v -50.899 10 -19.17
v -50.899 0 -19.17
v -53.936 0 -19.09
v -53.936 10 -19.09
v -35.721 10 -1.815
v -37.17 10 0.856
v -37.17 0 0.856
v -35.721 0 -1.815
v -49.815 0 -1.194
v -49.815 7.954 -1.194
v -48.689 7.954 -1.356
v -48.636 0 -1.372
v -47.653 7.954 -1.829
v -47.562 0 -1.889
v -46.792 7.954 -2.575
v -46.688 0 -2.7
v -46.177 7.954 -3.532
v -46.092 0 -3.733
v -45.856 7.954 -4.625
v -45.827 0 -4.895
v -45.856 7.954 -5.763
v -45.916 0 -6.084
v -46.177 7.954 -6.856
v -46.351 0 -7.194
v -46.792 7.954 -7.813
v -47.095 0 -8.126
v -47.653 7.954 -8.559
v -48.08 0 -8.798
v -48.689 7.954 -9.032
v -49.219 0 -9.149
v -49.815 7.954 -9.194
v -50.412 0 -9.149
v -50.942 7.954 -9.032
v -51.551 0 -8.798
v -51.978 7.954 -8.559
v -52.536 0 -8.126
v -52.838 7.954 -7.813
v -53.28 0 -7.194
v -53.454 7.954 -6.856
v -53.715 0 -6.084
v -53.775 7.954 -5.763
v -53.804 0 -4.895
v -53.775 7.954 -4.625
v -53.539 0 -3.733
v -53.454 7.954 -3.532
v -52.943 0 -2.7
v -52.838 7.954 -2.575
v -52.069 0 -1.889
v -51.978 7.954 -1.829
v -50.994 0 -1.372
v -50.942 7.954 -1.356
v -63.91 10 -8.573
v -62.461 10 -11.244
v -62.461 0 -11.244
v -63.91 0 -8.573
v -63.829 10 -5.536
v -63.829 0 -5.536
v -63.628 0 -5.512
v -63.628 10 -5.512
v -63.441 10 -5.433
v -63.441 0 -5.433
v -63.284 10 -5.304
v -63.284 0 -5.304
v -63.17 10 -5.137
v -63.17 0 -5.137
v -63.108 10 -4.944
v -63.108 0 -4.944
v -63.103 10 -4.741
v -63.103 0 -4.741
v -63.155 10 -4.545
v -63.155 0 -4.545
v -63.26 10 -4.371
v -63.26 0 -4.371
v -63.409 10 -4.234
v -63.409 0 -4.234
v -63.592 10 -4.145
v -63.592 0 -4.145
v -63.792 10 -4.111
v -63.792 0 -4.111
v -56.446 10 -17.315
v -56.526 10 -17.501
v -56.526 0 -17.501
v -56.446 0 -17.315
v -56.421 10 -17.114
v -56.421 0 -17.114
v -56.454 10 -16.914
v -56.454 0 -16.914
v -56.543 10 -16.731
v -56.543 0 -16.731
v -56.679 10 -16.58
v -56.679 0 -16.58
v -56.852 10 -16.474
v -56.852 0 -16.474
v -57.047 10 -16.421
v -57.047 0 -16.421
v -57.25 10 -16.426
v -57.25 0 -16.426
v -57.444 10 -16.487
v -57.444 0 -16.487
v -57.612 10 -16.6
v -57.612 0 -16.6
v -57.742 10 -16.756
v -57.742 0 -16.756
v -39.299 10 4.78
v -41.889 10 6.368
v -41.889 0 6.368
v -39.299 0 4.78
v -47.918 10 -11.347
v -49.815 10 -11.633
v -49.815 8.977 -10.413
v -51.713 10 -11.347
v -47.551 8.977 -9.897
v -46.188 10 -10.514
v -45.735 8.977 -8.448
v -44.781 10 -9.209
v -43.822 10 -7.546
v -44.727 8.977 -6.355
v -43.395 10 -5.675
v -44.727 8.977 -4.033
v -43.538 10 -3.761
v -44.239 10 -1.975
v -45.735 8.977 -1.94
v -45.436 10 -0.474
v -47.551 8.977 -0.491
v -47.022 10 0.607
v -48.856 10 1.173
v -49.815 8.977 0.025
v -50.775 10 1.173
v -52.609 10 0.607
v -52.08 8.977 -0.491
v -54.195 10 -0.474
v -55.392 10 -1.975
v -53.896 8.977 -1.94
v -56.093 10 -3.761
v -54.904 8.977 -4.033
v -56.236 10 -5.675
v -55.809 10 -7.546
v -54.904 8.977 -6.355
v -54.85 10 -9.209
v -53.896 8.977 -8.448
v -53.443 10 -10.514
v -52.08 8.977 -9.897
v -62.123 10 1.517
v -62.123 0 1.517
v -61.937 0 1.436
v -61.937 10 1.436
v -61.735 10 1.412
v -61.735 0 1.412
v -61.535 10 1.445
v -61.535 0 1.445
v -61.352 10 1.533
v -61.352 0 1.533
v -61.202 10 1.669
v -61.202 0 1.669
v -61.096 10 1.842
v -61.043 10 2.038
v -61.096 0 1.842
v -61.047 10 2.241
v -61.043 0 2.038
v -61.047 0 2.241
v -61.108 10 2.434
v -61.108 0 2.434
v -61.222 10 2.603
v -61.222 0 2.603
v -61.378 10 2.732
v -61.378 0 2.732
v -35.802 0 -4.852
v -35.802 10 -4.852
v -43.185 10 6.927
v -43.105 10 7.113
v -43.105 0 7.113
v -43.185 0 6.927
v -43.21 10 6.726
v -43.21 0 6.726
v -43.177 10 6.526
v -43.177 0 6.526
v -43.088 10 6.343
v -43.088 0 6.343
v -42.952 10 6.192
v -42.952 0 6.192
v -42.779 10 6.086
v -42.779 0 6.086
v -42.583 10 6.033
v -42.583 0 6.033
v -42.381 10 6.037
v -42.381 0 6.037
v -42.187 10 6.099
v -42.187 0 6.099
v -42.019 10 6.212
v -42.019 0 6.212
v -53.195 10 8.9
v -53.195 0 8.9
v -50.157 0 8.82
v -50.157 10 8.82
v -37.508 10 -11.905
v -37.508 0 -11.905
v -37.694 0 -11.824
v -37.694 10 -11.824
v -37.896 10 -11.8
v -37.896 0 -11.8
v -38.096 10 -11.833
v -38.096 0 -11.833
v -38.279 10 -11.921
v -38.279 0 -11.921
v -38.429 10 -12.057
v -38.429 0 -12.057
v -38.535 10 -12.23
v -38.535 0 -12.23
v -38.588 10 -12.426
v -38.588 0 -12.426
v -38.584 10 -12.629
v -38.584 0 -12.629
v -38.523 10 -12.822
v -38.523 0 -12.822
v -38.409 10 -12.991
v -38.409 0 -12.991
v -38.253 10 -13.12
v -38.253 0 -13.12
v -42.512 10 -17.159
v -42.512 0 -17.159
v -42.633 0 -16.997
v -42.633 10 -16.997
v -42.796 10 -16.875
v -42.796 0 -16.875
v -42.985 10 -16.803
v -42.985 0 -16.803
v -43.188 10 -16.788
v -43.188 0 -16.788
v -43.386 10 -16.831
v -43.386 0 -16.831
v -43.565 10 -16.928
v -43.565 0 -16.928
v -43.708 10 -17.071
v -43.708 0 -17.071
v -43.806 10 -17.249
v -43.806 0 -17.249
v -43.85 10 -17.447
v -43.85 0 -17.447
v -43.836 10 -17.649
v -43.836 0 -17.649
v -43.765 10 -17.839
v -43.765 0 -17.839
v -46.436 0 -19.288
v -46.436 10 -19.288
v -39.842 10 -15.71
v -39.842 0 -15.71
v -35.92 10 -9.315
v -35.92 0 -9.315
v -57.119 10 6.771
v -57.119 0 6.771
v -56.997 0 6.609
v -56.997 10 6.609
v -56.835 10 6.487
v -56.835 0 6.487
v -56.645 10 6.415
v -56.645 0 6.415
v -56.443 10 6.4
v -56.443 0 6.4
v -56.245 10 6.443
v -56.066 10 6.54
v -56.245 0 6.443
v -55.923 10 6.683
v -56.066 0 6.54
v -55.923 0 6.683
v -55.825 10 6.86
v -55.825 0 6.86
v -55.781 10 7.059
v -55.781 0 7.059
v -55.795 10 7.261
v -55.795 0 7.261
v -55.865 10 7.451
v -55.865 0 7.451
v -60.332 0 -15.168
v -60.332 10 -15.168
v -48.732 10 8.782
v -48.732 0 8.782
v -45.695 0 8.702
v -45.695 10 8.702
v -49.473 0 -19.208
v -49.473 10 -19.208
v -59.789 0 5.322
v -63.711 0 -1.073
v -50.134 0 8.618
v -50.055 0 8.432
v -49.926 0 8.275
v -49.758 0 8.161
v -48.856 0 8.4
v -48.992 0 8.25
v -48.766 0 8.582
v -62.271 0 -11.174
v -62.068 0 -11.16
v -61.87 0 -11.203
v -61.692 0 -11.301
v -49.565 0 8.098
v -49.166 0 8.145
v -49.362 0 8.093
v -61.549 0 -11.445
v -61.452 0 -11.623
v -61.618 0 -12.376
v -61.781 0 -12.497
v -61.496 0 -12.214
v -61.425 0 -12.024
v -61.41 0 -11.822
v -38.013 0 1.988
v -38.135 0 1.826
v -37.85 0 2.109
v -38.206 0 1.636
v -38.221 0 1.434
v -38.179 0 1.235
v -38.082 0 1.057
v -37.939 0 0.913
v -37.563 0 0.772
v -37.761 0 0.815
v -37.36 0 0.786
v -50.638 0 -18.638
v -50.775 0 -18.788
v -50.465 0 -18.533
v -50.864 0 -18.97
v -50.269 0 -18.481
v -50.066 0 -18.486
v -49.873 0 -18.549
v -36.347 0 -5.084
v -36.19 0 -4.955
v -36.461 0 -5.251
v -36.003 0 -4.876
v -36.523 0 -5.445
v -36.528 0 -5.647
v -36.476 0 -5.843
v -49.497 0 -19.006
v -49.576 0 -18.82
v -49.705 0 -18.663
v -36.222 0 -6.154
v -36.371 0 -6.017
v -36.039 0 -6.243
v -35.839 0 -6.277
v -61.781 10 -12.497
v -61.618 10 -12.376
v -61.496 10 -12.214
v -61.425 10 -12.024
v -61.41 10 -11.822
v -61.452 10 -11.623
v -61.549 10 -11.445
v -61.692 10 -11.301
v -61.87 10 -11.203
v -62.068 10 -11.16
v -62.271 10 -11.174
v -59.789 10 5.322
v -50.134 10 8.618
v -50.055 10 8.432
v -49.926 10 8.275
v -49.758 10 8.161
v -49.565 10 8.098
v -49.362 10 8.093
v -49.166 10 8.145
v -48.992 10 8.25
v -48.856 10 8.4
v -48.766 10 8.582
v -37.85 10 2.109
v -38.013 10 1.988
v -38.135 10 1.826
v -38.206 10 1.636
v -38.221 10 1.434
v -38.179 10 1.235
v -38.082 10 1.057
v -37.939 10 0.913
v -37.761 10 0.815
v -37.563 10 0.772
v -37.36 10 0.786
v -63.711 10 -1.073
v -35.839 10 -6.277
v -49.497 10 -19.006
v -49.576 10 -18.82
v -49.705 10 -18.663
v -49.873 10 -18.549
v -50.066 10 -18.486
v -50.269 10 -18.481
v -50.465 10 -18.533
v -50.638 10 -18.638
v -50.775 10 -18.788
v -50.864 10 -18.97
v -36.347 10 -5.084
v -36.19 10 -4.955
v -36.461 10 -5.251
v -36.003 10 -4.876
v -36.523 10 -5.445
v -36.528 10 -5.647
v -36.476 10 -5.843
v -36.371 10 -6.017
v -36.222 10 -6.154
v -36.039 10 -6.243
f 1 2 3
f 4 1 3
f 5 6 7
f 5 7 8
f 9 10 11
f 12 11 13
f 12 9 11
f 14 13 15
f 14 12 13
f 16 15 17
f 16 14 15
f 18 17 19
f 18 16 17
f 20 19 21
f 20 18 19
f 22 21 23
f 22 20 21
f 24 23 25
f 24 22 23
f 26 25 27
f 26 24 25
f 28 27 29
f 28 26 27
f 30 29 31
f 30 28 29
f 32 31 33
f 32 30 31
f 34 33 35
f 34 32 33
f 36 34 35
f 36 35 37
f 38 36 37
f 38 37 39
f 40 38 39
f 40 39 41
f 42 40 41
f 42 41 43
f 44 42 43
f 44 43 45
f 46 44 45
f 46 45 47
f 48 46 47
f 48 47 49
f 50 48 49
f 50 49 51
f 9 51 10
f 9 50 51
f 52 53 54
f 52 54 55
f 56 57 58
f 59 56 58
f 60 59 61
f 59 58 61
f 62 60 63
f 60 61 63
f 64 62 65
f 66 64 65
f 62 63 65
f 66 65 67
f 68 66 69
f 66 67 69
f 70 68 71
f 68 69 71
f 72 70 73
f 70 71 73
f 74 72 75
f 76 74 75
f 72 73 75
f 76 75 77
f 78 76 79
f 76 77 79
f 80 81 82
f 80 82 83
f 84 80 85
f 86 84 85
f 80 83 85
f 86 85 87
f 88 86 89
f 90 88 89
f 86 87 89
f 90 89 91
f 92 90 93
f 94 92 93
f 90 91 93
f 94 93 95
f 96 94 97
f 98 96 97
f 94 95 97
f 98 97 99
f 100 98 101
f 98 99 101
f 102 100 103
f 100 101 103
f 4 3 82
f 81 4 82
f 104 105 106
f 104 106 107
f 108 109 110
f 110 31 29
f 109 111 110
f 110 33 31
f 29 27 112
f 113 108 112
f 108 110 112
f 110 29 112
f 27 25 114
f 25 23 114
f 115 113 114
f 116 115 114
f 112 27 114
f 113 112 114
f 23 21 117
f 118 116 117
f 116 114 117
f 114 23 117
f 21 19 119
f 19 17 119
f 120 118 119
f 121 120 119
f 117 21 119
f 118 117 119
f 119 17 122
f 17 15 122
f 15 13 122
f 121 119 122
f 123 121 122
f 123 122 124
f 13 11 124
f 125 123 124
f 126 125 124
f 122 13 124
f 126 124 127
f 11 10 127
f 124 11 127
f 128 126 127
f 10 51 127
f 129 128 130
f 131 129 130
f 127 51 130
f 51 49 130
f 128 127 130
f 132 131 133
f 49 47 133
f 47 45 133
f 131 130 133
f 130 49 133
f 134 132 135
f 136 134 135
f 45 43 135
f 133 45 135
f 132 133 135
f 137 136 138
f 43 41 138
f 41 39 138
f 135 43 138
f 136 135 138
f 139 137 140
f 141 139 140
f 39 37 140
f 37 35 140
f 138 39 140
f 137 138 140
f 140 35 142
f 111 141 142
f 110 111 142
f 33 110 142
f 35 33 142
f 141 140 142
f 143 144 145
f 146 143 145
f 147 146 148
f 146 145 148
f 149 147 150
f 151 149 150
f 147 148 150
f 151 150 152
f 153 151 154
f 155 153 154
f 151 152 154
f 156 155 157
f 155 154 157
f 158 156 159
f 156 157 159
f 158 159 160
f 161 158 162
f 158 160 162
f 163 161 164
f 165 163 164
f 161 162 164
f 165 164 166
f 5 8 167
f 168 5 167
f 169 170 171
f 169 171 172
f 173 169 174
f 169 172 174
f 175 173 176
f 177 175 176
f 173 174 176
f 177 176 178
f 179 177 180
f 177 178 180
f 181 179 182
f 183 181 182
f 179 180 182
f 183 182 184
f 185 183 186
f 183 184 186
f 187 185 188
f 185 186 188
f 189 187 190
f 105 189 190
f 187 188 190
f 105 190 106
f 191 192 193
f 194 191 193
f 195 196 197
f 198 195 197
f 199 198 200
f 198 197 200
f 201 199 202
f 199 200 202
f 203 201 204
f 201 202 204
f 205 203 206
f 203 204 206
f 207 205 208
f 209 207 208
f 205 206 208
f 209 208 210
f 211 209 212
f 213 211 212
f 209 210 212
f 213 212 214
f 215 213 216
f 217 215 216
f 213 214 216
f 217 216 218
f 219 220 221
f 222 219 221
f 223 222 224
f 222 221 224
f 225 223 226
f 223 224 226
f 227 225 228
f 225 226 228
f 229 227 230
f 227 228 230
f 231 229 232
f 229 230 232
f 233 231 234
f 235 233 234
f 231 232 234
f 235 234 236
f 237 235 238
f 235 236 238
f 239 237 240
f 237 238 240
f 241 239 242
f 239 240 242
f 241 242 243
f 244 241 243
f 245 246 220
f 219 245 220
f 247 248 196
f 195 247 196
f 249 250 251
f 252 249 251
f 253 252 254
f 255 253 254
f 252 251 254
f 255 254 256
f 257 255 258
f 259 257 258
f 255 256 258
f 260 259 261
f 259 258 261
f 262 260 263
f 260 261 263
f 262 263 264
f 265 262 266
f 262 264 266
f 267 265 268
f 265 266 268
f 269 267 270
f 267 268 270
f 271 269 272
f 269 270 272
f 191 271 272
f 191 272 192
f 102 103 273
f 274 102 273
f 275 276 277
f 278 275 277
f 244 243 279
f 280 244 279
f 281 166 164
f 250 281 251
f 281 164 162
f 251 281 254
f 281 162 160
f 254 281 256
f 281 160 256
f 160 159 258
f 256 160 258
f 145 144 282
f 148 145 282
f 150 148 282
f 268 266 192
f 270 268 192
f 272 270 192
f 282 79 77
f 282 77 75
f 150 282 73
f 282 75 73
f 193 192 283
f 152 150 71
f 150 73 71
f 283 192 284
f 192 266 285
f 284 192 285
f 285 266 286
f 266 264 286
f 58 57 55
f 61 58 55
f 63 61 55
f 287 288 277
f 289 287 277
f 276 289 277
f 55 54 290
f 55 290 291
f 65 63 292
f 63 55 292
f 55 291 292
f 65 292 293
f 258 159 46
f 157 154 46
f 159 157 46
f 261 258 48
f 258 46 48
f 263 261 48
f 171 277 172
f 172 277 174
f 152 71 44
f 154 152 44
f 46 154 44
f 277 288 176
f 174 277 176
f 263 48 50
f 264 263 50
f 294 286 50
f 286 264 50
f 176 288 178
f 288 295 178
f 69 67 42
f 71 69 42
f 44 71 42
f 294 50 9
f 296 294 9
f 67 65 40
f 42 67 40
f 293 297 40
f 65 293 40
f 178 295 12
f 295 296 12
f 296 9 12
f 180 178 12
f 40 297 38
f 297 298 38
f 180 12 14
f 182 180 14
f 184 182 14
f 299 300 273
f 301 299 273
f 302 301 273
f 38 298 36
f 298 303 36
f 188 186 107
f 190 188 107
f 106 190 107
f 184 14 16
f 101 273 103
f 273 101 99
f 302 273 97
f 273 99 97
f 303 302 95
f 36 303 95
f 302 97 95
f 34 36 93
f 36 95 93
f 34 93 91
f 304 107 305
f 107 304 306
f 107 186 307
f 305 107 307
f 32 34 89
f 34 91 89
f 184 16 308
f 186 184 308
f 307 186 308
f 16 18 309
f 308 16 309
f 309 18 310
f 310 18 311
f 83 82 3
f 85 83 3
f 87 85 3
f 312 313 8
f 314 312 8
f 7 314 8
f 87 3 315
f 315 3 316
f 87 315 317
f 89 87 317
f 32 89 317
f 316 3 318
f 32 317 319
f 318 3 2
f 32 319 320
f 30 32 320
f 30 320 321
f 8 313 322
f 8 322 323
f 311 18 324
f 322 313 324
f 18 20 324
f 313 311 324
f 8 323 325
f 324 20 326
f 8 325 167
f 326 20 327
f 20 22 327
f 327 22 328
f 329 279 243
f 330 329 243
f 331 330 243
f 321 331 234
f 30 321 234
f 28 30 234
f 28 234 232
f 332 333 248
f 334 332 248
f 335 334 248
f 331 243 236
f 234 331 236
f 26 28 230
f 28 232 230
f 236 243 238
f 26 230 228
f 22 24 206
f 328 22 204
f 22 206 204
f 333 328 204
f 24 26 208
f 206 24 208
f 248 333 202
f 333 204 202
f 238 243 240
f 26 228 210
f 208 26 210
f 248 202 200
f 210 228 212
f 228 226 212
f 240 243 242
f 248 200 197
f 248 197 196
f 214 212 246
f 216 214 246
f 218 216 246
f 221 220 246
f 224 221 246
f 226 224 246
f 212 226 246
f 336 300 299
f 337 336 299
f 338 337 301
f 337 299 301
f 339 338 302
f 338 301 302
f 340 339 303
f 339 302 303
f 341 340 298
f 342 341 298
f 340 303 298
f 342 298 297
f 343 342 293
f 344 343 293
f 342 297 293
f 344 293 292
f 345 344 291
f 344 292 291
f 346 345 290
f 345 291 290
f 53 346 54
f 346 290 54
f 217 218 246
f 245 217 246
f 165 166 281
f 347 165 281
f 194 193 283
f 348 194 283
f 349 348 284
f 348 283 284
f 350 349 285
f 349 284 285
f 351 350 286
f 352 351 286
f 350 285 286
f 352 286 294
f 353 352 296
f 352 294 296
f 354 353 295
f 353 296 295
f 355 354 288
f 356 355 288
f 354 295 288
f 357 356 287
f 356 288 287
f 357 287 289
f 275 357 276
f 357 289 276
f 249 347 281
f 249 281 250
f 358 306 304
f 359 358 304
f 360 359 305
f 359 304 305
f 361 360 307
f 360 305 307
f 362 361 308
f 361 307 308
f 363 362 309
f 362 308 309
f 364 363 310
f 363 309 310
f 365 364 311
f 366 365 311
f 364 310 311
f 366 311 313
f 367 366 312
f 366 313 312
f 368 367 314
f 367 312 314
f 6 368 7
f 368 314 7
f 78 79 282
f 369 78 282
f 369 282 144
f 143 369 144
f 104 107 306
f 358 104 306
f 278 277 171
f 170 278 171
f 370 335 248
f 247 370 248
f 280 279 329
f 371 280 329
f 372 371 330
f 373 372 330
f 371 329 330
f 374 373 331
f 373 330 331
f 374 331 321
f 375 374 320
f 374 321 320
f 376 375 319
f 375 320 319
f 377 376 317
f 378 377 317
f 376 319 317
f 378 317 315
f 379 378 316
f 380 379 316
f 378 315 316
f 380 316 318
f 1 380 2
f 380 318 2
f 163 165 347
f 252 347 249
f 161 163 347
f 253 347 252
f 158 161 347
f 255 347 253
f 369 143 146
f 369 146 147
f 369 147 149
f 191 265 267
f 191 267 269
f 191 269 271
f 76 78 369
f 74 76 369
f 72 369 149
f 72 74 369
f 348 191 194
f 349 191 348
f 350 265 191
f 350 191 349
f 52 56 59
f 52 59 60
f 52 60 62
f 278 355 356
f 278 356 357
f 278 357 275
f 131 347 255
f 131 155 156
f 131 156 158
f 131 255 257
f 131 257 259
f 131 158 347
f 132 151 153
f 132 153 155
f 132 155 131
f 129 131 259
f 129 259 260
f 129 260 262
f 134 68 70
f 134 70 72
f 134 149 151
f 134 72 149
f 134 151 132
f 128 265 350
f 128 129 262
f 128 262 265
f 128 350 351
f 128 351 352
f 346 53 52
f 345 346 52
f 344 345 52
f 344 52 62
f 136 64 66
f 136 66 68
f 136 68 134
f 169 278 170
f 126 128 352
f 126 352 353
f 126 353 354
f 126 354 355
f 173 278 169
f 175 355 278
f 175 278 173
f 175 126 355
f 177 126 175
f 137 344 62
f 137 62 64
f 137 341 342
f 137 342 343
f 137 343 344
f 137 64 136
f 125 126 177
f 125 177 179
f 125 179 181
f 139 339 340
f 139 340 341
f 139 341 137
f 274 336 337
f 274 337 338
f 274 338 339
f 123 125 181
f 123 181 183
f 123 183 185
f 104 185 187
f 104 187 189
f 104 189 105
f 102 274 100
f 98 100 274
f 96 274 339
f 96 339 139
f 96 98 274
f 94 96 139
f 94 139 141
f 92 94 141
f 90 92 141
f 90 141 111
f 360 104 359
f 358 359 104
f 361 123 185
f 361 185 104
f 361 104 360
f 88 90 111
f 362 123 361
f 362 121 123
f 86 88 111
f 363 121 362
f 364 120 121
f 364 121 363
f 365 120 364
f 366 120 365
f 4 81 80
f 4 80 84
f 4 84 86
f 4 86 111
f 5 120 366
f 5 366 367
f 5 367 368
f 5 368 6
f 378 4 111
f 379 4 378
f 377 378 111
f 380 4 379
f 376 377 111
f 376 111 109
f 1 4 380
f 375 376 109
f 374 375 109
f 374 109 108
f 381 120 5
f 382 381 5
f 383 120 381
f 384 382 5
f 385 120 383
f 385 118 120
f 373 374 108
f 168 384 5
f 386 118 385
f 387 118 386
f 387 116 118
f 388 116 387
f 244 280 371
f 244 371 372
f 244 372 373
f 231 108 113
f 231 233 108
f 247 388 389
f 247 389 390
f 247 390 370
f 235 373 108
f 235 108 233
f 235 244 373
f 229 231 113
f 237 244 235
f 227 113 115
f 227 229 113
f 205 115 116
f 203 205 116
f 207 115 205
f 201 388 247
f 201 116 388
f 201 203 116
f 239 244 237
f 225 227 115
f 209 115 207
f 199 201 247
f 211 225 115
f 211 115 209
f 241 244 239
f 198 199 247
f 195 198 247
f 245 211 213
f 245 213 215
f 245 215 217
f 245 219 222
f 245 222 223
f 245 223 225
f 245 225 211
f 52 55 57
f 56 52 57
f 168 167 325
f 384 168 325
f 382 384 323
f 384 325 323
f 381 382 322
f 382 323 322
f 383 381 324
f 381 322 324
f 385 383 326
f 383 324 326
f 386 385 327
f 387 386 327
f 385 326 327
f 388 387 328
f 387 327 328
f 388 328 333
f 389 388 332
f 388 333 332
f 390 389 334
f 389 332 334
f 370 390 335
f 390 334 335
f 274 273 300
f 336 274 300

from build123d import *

# Parameters (mm, degrees)
SKETCH1_R                                           = 4
BOSS_EXTRUDE1_DEPTH                                 = 10
CSK_FOR_1_4_FLAT_HEAD_MACHINE_SCREW_100_D           = 7.14248
CSK_FOR_1_4_FLAT_HEAD_MACHINE_SCREW_100_CSINK_D     = 12.8778
CSK_FOR_1_4_FLAT_HEAD_MACHINE_SCREW_100_CSINK_ANGLE = 100


with BuildPart() as part:
    # Sketch1 → Boss-Extrude1 (new body)
    with BuildSketch(Plane(origin=(0, 0, 0), x_dir=(1, 0, 0), z_dir=(0, 1, 0))):
        with BuildLine():
            Line((-62.460834708, 11.244058758), (-63.909867943, 8.573388842))
            Line((-63.909867943, 8.573388842), (-63.829432577, 5.536004231))
            ThreePointArc((-63.829432577, 5.536004231), (-63.097972523, 4.842285457), (-63.791691298, 4.110825404))
            Line((-63.791691298, 4.110825404), (-63.711255932, 1.073440793))
            Line((-63.711255932, 1.073440793), (-62.122904556, -1.516793758))
            ThreePointArc((-62.122904556, -1.516793758), (-61.142582181, -1.751841812), (-61.377630236, -2.732164188))
            Line((-61.377630236, -2.732164188), (-59.78927886, -5.322398739))
            Line((-59.78927886, -5.322398739), (-57.118608944, -6.771431974))
            ThreePointArc((-57.118608944, -6.771431974), (-56.152100835, -6.484828372), (-55.865497234, -7.451336481))
            Line((-55.865497234, -7.451336481), (-53.194827318, -8.900369716))
            Line((-53.194827318, -8.900369716), (-50.157442707, -8.81993435))
            ThreePointArc((-50.157442707, -8.81993435), (-49.463723933, -8.088474296), (-48.732263879, -8.782193071))
            Line((-48.732263879, -8.782193071), (-45.694879269, -8.701757705))
            Line((-45.694879269, -8.701757705), (-43.104644718, -7.11340633))
            ThreePointArc((-43.104644718, -7.11340633), (-42.869596663, -6.133083954), (-41.889274288, -6.368132009))
            Line((-41.889274288, -6.368132009), (-39.299039737, -4.779780634))
            Line((-39.299039737, -4.779780634), (-37.850006502, -2.109110717))
            ThreePointArc((-37.850006502, -2.109110717), (-38.136610103, -1.142602609), (-37.170101995, -0.855999007))
            Line((-37.170101995, -0.855999007), (-35.72106876, 1.814670909))
            Line((-35.72106876, 1.814670909), (-35.801504126, 4.852055519))
            ThreePointArc((-35.801504126, 4.852055519), (-36.532964179, 5.545774294), (-35.839245405, 6.277234347))
            Line((-35.839245405, 6.277234347), (-35.919680771, 9.314618958))
            Line((-35.919680771, 9.314618958), (-37.508032146, 11.904853509))
            ThreePointArc((-37.508032146, 11.904853509), (-38.488354522, 12.139901563), (-38.253306467, 13.120223939))
            Line((-38.253306467, 13.120223939), (-39.841657842, 15.71045849))
            Line((-39.841657842, 15.71045849), (-42.512327759, 17.159491725))
            ThreePointArc((-42.512327759, 17.159491725), (-43.478835867, 16.872888123), (-43.765439468, 17.839396232))
            Line((-43.765439468, 17.839396232), (-46.436109385, 19.288429467))
            Line((-46.436109385, 19.288429467), (-49.473493995, 19.207994101))
            ThreePointArc((-49.473493995, 19.207994101), (-50.16721277, 18.476534047), (-50.898672823, 19.170252822))
            Line((-50.898672823, 19.170252822), (-53.936057434, 19.089817456))
            Line((-53.936057434, 19.089817456), (-56.526291984, 17.501466081))
            ThreePointArc((-56.526291984, 17.501466081), (-56.761340039, 16.521143705), (-57.741662415, 16.75619176))
            Line((-57.741662415, 16.75619176), (-60.331896965, 15.167840385))
            Line((-60.331896965, 15.167840385), (-61.7809302, 12.497170468))
            ThreePointArc((-61.7809302, 12.497170468), (-61.494326599, 11.530662359), (-62.460834708, 11.244058758))
        make_face()
        with Locations(Location((-49.815468351, 5.194029875, 0), (0, 0, 270))):
            Circle(SKETCH1_R, mode=Mode.SUBTRACT)
    extrude(amount=BOSS_EXTRUDE1_DEPTH)

    # CSK for 1/4 Flat Head Machine Screw (100)1 (through all)
    with Locations(Plane(origin=(-49.815468351, 10, -5.194029875), x_dir=(0, 0, 1), z_dir=(0, 1, 0))):
        with Locations((0, 0)):
            CounterSinkHole(CSK_FOR_1_4_FLAT_HEAD_MACHINE_SCREW_100_D / 2, CSK_FOR_1_4_FLAT_HEAD_MACHINE_SCREW_100_CSINK_D / 2, counter_sink_angle=CSK_FOR_1_4_FLAT_HEAD_MACHINE_SCREW_100_CSINK_ANGLE)


solid = part.part
